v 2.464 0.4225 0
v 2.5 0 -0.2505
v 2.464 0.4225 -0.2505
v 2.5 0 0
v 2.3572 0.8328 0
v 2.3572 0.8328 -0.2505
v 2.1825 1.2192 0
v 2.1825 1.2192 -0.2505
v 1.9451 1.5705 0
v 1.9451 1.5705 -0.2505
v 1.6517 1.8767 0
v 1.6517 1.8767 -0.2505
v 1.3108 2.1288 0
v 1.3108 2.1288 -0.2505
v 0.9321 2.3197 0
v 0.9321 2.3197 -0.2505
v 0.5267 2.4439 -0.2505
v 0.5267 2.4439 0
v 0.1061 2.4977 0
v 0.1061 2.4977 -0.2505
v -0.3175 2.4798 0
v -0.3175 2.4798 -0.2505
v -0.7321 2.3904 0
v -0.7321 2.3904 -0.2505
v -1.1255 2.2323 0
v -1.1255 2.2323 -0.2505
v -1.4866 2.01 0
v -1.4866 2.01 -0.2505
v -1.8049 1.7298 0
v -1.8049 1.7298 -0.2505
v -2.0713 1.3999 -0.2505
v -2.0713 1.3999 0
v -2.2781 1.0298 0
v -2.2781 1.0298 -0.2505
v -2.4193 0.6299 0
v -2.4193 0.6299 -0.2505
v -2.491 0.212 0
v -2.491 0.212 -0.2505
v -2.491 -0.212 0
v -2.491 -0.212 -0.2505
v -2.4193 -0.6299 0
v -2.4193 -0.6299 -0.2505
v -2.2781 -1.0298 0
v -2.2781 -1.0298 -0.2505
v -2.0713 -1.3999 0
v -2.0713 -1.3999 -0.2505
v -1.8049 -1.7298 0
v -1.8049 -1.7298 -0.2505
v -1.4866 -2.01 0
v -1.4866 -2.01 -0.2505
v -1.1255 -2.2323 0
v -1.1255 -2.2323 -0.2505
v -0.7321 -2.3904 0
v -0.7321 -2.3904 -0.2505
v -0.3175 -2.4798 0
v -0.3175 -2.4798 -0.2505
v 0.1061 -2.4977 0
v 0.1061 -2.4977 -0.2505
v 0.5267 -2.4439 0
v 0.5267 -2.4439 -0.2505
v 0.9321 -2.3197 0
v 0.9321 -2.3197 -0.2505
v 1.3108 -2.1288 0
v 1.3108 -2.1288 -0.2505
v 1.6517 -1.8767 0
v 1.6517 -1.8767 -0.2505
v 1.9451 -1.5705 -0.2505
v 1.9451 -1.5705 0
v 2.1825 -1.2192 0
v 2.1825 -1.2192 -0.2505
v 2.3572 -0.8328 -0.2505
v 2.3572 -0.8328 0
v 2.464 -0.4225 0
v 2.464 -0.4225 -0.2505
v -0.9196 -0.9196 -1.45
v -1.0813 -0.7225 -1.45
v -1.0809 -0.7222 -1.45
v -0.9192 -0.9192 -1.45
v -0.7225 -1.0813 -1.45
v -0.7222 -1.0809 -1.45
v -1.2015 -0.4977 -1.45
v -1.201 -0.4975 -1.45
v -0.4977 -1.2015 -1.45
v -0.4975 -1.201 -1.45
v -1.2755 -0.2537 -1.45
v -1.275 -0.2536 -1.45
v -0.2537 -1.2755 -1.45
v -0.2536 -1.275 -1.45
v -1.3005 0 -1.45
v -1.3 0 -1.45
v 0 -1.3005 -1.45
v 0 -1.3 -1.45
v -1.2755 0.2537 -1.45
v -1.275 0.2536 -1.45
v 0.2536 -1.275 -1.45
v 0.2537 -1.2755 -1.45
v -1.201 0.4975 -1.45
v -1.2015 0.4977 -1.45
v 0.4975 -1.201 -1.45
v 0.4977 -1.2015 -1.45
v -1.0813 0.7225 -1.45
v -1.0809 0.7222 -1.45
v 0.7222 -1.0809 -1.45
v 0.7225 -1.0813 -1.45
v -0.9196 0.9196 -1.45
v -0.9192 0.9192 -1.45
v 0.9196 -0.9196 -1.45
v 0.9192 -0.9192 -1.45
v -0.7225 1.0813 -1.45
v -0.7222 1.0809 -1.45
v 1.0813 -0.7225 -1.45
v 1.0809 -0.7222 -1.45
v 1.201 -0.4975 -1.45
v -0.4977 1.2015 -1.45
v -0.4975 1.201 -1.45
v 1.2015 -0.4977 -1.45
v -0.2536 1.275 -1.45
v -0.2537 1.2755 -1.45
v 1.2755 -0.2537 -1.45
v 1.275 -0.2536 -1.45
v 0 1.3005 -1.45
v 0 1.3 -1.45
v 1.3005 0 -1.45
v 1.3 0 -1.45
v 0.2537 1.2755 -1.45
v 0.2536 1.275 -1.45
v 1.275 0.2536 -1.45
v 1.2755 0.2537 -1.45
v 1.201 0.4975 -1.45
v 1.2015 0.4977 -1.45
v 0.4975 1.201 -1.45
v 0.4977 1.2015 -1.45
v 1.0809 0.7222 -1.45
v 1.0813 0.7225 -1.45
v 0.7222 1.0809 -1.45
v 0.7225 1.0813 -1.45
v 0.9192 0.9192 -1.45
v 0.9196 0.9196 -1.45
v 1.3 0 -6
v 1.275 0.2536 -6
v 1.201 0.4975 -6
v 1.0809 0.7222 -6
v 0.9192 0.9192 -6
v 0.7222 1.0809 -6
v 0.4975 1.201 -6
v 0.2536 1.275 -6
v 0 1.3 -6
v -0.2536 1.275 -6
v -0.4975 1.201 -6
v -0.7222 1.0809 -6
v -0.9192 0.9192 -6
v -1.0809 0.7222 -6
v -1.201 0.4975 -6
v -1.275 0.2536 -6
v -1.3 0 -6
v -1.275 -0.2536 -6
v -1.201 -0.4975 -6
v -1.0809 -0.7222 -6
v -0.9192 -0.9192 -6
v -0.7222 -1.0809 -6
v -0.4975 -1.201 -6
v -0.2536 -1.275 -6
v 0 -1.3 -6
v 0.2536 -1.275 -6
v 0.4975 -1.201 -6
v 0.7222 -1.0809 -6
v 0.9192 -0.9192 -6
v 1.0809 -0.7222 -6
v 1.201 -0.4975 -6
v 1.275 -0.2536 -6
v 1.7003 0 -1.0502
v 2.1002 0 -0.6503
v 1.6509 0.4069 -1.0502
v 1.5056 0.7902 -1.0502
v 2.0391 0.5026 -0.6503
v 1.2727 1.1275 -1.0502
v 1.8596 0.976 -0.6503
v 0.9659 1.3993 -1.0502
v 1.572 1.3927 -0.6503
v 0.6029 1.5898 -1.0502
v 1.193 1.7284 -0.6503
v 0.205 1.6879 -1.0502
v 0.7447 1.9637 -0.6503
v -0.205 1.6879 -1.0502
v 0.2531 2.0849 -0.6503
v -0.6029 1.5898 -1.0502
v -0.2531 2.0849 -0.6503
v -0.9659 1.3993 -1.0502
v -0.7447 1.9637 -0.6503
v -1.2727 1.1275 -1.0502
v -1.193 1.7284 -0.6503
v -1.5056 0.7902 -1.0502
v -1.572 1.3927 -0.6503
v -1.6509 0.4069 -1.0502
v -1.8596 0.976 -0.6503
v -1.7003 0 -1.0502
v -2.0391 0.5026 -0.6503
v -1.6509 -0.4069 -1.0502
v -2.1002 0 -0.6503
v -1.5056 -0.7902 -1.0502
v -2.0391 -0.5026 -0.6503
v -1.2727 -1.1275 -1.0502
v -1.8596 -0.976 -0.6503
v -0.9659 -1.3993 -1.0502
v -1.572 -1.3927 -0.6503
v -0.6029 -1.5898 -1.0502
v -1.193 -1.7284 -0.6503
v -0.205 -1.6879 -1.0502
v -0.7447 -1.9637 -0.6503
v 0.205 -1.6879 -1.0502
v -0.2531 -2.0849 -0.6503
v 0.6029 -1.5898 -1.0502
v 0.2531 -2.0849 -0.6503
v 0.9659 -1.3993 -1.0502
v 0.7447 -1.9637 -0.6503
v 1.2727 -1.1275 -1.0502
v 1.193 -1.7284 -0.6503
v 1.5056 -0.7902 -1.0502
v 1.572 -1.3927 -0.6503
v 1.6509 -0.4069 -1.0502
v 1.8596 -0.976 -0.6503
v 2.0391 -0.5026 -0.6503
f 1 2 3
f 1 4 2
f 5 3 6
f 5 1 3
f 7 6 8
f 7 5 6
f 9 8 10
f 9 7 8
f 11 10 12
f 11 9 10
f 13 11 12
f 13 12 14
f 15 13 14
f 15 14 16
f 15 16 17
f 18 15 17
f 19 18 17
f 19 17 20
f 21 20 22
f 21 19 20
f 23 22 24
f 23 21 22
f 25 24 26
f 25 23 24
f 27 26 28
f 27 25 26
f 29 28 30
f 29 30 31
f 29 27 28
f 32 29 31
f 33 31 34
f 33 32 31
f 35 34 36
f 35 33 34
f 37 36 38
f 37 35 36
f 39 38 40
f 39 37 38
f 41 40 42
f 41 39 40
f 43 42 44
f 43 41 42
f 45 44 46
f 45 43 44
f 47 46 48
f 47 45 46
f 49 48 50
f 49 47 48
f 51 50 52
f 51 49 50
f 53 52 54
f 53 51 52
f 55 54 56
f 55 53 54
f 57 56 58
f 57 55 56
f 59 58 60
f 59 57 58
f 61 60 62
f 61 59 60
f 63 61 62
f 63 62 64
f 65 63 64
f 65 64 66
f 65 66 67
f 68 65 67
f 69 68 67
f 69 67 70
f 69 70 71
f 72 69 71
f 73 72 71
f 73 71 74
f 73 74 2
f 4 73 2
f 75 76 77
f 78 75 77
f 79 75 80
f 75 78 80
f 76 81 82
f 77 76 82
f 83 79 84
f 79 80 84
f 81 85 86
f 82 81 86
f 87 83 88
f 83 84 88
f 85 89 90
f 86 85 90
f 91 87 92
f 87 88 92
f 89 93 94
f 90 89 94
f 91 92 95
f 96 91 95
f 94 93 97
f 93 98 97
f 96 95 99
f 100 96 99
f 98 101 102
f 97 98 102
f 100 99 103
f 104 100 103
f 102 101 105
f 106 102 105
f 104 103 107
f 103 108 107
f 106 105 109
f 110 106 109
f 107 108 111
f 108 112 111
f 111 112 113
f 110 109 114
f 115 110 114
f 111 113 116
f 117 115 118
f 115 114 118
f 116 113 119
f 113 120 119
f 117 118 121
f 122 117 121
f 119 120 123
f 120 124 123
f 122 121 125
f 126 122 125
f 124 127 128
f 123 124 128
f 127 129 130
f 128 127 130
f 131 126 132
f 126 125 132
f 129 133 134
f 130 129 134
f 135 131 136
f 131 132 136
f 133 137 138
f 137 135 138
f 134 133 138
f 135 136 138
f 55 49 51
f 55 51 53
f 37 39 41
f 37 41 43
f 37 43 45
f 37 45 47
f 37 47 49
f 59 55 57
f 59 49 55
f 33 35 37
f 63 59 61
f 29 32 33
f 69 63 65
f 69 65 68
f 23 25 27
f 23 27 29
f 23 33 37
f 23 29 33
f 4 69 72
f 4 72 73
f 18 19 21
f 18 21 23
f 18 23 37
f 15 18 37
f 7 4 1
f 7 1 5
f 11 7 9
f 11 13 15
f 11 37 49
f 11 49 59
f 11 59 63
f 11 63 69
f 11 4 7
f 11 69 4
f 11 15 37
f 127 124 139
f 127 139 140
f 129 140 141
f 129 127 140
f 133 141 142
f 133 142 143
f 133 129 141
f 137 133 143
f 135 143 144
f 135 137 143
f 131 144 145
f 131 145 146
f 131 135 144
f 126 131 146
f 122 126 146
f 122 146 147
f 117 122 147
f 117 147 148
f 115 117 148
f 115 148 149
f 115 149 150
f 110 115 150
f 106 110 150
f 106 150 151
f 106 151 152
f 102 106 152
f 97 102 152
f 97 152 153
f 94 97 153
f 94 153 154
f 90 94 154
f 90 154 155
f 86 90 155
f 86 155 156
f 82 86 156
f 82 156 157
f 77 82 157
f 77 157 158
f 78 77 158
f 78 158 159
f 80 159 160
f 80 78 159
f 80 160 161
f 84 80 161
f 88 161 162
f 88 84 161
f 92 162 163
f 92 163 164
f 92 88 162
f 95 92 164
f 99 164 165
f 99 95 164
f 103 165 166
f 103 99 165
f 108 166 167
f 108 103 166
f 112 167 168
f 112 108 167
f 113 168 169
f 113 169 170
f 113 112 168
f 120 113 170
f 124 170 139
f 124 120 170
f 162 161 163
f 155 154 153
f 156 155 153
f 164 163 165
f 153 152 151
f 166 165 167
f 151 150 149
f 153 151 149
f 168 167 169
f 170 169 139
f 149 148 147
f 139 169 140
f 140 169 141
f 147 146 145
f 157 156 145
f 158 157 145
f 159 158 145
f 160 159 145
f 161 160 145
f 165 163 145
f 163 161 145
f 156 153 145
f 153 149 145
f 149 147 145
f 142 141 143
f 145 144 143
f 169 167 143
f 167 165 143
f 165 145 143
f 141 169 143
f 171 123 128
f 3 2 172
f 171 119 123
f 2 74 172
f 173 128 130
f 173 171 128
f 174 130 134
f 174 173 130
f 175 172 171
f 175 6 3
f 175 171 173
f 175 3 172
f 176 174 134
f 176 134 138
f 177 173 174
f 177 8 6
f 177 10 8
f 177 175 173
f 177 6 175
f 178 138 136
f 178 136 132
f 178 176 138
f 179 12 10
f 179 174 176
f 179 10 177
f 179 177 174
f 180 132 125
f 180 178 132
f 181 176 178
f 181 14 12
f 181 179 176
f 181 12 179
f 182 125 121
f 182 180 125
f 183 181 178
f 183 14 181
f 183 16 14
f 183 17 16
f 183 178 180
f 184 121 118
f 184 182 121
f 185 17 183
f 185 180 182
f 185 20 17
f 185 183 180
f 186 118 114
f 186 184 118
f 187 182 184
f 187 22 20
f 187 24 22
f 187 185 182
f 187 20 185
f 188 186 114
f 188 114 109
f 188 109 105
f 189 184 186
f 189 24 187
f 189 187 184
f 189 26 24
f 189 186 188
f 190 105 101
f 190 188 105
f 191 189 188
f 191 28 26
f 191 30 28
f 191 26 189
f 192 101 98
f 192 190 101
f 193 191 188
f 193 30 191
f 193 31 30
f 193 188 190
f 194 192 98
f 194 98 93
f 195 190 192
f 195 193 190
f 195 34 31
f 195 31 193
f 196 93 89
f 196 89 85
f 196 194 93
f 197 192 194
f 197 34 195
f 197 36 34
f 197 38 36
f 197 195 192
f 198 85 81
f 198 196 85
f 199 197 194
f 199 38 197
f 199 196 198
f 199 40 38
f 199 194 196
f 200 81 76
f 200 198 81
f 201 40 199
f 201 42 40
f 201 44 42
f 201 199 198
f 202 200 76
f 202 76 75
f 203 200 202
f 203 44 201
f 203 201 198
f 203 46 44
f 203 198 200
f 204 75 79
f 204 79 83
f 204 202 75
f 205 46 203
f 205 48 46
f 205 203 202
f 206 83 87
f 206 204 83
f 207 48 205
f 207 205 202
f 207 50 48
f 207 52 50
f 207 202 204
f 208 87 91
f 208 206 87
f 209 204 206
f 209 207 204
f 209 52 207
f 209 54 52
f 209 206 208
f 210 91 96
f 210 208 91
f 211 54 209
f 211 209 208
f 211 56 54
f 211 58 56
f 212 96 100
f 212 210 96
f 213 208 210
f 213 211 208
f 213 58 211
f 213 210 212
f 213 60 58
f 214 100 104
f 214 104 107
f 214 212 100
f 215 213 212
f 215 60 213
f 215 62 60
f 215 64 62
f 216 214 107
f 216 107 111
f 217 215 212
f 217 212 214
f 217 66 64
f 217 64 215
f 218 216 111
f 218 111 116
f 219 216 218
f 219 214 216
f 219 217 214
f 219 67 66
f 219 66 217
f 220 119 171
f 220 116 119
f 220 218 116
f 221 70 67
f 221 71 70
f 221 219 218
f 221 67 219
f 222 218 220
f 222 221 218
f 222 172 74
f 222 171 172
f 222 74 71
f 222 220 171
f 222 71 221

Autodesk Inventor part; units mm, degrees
ref_plane "YZ Plane" through (0, 0, 0) normal (1, 0, 0) x (0, 1, 0)
ref_plane "XZ Plane" through (0, 0, 0) normal (0, 1, 0) x (-1, 0, 0)
ref_plane "XY Plane" through (0, 0, 0) normal (0, 0, 1) x (1, 0, 0)
sketch "スケッチ1" plane through (0, 0, 0) normal (0, 0, 1) x (1, 0, 0)
  circle A0 centre (0, 0) radius 1.3
  dimension "d0" = 2.6
extrude "押し出し1" add sketch "スケッチ1" against normal blind 6
sketch "スケッチ2" plane through (0, 0, 0) normal (0, 0, 1) x (1, 0, 0)
  circle A0 centre (0, 0) radius 2.5
  dimension "d3" = 5
extrude "押し出し2" add sketch "スケッチ2" against normal blind 1.45
chamfer "面取り3" distance 1.2 angle 45 1 edges at (-2.5, 0, -1.45)
thread "ねじ1" size "M2.6x0.45" class "6g" standard "ANSI Metric M Profile" full length
properties part number "ネジ皿m2.6,06" material "鋼、高強度、低合金"
